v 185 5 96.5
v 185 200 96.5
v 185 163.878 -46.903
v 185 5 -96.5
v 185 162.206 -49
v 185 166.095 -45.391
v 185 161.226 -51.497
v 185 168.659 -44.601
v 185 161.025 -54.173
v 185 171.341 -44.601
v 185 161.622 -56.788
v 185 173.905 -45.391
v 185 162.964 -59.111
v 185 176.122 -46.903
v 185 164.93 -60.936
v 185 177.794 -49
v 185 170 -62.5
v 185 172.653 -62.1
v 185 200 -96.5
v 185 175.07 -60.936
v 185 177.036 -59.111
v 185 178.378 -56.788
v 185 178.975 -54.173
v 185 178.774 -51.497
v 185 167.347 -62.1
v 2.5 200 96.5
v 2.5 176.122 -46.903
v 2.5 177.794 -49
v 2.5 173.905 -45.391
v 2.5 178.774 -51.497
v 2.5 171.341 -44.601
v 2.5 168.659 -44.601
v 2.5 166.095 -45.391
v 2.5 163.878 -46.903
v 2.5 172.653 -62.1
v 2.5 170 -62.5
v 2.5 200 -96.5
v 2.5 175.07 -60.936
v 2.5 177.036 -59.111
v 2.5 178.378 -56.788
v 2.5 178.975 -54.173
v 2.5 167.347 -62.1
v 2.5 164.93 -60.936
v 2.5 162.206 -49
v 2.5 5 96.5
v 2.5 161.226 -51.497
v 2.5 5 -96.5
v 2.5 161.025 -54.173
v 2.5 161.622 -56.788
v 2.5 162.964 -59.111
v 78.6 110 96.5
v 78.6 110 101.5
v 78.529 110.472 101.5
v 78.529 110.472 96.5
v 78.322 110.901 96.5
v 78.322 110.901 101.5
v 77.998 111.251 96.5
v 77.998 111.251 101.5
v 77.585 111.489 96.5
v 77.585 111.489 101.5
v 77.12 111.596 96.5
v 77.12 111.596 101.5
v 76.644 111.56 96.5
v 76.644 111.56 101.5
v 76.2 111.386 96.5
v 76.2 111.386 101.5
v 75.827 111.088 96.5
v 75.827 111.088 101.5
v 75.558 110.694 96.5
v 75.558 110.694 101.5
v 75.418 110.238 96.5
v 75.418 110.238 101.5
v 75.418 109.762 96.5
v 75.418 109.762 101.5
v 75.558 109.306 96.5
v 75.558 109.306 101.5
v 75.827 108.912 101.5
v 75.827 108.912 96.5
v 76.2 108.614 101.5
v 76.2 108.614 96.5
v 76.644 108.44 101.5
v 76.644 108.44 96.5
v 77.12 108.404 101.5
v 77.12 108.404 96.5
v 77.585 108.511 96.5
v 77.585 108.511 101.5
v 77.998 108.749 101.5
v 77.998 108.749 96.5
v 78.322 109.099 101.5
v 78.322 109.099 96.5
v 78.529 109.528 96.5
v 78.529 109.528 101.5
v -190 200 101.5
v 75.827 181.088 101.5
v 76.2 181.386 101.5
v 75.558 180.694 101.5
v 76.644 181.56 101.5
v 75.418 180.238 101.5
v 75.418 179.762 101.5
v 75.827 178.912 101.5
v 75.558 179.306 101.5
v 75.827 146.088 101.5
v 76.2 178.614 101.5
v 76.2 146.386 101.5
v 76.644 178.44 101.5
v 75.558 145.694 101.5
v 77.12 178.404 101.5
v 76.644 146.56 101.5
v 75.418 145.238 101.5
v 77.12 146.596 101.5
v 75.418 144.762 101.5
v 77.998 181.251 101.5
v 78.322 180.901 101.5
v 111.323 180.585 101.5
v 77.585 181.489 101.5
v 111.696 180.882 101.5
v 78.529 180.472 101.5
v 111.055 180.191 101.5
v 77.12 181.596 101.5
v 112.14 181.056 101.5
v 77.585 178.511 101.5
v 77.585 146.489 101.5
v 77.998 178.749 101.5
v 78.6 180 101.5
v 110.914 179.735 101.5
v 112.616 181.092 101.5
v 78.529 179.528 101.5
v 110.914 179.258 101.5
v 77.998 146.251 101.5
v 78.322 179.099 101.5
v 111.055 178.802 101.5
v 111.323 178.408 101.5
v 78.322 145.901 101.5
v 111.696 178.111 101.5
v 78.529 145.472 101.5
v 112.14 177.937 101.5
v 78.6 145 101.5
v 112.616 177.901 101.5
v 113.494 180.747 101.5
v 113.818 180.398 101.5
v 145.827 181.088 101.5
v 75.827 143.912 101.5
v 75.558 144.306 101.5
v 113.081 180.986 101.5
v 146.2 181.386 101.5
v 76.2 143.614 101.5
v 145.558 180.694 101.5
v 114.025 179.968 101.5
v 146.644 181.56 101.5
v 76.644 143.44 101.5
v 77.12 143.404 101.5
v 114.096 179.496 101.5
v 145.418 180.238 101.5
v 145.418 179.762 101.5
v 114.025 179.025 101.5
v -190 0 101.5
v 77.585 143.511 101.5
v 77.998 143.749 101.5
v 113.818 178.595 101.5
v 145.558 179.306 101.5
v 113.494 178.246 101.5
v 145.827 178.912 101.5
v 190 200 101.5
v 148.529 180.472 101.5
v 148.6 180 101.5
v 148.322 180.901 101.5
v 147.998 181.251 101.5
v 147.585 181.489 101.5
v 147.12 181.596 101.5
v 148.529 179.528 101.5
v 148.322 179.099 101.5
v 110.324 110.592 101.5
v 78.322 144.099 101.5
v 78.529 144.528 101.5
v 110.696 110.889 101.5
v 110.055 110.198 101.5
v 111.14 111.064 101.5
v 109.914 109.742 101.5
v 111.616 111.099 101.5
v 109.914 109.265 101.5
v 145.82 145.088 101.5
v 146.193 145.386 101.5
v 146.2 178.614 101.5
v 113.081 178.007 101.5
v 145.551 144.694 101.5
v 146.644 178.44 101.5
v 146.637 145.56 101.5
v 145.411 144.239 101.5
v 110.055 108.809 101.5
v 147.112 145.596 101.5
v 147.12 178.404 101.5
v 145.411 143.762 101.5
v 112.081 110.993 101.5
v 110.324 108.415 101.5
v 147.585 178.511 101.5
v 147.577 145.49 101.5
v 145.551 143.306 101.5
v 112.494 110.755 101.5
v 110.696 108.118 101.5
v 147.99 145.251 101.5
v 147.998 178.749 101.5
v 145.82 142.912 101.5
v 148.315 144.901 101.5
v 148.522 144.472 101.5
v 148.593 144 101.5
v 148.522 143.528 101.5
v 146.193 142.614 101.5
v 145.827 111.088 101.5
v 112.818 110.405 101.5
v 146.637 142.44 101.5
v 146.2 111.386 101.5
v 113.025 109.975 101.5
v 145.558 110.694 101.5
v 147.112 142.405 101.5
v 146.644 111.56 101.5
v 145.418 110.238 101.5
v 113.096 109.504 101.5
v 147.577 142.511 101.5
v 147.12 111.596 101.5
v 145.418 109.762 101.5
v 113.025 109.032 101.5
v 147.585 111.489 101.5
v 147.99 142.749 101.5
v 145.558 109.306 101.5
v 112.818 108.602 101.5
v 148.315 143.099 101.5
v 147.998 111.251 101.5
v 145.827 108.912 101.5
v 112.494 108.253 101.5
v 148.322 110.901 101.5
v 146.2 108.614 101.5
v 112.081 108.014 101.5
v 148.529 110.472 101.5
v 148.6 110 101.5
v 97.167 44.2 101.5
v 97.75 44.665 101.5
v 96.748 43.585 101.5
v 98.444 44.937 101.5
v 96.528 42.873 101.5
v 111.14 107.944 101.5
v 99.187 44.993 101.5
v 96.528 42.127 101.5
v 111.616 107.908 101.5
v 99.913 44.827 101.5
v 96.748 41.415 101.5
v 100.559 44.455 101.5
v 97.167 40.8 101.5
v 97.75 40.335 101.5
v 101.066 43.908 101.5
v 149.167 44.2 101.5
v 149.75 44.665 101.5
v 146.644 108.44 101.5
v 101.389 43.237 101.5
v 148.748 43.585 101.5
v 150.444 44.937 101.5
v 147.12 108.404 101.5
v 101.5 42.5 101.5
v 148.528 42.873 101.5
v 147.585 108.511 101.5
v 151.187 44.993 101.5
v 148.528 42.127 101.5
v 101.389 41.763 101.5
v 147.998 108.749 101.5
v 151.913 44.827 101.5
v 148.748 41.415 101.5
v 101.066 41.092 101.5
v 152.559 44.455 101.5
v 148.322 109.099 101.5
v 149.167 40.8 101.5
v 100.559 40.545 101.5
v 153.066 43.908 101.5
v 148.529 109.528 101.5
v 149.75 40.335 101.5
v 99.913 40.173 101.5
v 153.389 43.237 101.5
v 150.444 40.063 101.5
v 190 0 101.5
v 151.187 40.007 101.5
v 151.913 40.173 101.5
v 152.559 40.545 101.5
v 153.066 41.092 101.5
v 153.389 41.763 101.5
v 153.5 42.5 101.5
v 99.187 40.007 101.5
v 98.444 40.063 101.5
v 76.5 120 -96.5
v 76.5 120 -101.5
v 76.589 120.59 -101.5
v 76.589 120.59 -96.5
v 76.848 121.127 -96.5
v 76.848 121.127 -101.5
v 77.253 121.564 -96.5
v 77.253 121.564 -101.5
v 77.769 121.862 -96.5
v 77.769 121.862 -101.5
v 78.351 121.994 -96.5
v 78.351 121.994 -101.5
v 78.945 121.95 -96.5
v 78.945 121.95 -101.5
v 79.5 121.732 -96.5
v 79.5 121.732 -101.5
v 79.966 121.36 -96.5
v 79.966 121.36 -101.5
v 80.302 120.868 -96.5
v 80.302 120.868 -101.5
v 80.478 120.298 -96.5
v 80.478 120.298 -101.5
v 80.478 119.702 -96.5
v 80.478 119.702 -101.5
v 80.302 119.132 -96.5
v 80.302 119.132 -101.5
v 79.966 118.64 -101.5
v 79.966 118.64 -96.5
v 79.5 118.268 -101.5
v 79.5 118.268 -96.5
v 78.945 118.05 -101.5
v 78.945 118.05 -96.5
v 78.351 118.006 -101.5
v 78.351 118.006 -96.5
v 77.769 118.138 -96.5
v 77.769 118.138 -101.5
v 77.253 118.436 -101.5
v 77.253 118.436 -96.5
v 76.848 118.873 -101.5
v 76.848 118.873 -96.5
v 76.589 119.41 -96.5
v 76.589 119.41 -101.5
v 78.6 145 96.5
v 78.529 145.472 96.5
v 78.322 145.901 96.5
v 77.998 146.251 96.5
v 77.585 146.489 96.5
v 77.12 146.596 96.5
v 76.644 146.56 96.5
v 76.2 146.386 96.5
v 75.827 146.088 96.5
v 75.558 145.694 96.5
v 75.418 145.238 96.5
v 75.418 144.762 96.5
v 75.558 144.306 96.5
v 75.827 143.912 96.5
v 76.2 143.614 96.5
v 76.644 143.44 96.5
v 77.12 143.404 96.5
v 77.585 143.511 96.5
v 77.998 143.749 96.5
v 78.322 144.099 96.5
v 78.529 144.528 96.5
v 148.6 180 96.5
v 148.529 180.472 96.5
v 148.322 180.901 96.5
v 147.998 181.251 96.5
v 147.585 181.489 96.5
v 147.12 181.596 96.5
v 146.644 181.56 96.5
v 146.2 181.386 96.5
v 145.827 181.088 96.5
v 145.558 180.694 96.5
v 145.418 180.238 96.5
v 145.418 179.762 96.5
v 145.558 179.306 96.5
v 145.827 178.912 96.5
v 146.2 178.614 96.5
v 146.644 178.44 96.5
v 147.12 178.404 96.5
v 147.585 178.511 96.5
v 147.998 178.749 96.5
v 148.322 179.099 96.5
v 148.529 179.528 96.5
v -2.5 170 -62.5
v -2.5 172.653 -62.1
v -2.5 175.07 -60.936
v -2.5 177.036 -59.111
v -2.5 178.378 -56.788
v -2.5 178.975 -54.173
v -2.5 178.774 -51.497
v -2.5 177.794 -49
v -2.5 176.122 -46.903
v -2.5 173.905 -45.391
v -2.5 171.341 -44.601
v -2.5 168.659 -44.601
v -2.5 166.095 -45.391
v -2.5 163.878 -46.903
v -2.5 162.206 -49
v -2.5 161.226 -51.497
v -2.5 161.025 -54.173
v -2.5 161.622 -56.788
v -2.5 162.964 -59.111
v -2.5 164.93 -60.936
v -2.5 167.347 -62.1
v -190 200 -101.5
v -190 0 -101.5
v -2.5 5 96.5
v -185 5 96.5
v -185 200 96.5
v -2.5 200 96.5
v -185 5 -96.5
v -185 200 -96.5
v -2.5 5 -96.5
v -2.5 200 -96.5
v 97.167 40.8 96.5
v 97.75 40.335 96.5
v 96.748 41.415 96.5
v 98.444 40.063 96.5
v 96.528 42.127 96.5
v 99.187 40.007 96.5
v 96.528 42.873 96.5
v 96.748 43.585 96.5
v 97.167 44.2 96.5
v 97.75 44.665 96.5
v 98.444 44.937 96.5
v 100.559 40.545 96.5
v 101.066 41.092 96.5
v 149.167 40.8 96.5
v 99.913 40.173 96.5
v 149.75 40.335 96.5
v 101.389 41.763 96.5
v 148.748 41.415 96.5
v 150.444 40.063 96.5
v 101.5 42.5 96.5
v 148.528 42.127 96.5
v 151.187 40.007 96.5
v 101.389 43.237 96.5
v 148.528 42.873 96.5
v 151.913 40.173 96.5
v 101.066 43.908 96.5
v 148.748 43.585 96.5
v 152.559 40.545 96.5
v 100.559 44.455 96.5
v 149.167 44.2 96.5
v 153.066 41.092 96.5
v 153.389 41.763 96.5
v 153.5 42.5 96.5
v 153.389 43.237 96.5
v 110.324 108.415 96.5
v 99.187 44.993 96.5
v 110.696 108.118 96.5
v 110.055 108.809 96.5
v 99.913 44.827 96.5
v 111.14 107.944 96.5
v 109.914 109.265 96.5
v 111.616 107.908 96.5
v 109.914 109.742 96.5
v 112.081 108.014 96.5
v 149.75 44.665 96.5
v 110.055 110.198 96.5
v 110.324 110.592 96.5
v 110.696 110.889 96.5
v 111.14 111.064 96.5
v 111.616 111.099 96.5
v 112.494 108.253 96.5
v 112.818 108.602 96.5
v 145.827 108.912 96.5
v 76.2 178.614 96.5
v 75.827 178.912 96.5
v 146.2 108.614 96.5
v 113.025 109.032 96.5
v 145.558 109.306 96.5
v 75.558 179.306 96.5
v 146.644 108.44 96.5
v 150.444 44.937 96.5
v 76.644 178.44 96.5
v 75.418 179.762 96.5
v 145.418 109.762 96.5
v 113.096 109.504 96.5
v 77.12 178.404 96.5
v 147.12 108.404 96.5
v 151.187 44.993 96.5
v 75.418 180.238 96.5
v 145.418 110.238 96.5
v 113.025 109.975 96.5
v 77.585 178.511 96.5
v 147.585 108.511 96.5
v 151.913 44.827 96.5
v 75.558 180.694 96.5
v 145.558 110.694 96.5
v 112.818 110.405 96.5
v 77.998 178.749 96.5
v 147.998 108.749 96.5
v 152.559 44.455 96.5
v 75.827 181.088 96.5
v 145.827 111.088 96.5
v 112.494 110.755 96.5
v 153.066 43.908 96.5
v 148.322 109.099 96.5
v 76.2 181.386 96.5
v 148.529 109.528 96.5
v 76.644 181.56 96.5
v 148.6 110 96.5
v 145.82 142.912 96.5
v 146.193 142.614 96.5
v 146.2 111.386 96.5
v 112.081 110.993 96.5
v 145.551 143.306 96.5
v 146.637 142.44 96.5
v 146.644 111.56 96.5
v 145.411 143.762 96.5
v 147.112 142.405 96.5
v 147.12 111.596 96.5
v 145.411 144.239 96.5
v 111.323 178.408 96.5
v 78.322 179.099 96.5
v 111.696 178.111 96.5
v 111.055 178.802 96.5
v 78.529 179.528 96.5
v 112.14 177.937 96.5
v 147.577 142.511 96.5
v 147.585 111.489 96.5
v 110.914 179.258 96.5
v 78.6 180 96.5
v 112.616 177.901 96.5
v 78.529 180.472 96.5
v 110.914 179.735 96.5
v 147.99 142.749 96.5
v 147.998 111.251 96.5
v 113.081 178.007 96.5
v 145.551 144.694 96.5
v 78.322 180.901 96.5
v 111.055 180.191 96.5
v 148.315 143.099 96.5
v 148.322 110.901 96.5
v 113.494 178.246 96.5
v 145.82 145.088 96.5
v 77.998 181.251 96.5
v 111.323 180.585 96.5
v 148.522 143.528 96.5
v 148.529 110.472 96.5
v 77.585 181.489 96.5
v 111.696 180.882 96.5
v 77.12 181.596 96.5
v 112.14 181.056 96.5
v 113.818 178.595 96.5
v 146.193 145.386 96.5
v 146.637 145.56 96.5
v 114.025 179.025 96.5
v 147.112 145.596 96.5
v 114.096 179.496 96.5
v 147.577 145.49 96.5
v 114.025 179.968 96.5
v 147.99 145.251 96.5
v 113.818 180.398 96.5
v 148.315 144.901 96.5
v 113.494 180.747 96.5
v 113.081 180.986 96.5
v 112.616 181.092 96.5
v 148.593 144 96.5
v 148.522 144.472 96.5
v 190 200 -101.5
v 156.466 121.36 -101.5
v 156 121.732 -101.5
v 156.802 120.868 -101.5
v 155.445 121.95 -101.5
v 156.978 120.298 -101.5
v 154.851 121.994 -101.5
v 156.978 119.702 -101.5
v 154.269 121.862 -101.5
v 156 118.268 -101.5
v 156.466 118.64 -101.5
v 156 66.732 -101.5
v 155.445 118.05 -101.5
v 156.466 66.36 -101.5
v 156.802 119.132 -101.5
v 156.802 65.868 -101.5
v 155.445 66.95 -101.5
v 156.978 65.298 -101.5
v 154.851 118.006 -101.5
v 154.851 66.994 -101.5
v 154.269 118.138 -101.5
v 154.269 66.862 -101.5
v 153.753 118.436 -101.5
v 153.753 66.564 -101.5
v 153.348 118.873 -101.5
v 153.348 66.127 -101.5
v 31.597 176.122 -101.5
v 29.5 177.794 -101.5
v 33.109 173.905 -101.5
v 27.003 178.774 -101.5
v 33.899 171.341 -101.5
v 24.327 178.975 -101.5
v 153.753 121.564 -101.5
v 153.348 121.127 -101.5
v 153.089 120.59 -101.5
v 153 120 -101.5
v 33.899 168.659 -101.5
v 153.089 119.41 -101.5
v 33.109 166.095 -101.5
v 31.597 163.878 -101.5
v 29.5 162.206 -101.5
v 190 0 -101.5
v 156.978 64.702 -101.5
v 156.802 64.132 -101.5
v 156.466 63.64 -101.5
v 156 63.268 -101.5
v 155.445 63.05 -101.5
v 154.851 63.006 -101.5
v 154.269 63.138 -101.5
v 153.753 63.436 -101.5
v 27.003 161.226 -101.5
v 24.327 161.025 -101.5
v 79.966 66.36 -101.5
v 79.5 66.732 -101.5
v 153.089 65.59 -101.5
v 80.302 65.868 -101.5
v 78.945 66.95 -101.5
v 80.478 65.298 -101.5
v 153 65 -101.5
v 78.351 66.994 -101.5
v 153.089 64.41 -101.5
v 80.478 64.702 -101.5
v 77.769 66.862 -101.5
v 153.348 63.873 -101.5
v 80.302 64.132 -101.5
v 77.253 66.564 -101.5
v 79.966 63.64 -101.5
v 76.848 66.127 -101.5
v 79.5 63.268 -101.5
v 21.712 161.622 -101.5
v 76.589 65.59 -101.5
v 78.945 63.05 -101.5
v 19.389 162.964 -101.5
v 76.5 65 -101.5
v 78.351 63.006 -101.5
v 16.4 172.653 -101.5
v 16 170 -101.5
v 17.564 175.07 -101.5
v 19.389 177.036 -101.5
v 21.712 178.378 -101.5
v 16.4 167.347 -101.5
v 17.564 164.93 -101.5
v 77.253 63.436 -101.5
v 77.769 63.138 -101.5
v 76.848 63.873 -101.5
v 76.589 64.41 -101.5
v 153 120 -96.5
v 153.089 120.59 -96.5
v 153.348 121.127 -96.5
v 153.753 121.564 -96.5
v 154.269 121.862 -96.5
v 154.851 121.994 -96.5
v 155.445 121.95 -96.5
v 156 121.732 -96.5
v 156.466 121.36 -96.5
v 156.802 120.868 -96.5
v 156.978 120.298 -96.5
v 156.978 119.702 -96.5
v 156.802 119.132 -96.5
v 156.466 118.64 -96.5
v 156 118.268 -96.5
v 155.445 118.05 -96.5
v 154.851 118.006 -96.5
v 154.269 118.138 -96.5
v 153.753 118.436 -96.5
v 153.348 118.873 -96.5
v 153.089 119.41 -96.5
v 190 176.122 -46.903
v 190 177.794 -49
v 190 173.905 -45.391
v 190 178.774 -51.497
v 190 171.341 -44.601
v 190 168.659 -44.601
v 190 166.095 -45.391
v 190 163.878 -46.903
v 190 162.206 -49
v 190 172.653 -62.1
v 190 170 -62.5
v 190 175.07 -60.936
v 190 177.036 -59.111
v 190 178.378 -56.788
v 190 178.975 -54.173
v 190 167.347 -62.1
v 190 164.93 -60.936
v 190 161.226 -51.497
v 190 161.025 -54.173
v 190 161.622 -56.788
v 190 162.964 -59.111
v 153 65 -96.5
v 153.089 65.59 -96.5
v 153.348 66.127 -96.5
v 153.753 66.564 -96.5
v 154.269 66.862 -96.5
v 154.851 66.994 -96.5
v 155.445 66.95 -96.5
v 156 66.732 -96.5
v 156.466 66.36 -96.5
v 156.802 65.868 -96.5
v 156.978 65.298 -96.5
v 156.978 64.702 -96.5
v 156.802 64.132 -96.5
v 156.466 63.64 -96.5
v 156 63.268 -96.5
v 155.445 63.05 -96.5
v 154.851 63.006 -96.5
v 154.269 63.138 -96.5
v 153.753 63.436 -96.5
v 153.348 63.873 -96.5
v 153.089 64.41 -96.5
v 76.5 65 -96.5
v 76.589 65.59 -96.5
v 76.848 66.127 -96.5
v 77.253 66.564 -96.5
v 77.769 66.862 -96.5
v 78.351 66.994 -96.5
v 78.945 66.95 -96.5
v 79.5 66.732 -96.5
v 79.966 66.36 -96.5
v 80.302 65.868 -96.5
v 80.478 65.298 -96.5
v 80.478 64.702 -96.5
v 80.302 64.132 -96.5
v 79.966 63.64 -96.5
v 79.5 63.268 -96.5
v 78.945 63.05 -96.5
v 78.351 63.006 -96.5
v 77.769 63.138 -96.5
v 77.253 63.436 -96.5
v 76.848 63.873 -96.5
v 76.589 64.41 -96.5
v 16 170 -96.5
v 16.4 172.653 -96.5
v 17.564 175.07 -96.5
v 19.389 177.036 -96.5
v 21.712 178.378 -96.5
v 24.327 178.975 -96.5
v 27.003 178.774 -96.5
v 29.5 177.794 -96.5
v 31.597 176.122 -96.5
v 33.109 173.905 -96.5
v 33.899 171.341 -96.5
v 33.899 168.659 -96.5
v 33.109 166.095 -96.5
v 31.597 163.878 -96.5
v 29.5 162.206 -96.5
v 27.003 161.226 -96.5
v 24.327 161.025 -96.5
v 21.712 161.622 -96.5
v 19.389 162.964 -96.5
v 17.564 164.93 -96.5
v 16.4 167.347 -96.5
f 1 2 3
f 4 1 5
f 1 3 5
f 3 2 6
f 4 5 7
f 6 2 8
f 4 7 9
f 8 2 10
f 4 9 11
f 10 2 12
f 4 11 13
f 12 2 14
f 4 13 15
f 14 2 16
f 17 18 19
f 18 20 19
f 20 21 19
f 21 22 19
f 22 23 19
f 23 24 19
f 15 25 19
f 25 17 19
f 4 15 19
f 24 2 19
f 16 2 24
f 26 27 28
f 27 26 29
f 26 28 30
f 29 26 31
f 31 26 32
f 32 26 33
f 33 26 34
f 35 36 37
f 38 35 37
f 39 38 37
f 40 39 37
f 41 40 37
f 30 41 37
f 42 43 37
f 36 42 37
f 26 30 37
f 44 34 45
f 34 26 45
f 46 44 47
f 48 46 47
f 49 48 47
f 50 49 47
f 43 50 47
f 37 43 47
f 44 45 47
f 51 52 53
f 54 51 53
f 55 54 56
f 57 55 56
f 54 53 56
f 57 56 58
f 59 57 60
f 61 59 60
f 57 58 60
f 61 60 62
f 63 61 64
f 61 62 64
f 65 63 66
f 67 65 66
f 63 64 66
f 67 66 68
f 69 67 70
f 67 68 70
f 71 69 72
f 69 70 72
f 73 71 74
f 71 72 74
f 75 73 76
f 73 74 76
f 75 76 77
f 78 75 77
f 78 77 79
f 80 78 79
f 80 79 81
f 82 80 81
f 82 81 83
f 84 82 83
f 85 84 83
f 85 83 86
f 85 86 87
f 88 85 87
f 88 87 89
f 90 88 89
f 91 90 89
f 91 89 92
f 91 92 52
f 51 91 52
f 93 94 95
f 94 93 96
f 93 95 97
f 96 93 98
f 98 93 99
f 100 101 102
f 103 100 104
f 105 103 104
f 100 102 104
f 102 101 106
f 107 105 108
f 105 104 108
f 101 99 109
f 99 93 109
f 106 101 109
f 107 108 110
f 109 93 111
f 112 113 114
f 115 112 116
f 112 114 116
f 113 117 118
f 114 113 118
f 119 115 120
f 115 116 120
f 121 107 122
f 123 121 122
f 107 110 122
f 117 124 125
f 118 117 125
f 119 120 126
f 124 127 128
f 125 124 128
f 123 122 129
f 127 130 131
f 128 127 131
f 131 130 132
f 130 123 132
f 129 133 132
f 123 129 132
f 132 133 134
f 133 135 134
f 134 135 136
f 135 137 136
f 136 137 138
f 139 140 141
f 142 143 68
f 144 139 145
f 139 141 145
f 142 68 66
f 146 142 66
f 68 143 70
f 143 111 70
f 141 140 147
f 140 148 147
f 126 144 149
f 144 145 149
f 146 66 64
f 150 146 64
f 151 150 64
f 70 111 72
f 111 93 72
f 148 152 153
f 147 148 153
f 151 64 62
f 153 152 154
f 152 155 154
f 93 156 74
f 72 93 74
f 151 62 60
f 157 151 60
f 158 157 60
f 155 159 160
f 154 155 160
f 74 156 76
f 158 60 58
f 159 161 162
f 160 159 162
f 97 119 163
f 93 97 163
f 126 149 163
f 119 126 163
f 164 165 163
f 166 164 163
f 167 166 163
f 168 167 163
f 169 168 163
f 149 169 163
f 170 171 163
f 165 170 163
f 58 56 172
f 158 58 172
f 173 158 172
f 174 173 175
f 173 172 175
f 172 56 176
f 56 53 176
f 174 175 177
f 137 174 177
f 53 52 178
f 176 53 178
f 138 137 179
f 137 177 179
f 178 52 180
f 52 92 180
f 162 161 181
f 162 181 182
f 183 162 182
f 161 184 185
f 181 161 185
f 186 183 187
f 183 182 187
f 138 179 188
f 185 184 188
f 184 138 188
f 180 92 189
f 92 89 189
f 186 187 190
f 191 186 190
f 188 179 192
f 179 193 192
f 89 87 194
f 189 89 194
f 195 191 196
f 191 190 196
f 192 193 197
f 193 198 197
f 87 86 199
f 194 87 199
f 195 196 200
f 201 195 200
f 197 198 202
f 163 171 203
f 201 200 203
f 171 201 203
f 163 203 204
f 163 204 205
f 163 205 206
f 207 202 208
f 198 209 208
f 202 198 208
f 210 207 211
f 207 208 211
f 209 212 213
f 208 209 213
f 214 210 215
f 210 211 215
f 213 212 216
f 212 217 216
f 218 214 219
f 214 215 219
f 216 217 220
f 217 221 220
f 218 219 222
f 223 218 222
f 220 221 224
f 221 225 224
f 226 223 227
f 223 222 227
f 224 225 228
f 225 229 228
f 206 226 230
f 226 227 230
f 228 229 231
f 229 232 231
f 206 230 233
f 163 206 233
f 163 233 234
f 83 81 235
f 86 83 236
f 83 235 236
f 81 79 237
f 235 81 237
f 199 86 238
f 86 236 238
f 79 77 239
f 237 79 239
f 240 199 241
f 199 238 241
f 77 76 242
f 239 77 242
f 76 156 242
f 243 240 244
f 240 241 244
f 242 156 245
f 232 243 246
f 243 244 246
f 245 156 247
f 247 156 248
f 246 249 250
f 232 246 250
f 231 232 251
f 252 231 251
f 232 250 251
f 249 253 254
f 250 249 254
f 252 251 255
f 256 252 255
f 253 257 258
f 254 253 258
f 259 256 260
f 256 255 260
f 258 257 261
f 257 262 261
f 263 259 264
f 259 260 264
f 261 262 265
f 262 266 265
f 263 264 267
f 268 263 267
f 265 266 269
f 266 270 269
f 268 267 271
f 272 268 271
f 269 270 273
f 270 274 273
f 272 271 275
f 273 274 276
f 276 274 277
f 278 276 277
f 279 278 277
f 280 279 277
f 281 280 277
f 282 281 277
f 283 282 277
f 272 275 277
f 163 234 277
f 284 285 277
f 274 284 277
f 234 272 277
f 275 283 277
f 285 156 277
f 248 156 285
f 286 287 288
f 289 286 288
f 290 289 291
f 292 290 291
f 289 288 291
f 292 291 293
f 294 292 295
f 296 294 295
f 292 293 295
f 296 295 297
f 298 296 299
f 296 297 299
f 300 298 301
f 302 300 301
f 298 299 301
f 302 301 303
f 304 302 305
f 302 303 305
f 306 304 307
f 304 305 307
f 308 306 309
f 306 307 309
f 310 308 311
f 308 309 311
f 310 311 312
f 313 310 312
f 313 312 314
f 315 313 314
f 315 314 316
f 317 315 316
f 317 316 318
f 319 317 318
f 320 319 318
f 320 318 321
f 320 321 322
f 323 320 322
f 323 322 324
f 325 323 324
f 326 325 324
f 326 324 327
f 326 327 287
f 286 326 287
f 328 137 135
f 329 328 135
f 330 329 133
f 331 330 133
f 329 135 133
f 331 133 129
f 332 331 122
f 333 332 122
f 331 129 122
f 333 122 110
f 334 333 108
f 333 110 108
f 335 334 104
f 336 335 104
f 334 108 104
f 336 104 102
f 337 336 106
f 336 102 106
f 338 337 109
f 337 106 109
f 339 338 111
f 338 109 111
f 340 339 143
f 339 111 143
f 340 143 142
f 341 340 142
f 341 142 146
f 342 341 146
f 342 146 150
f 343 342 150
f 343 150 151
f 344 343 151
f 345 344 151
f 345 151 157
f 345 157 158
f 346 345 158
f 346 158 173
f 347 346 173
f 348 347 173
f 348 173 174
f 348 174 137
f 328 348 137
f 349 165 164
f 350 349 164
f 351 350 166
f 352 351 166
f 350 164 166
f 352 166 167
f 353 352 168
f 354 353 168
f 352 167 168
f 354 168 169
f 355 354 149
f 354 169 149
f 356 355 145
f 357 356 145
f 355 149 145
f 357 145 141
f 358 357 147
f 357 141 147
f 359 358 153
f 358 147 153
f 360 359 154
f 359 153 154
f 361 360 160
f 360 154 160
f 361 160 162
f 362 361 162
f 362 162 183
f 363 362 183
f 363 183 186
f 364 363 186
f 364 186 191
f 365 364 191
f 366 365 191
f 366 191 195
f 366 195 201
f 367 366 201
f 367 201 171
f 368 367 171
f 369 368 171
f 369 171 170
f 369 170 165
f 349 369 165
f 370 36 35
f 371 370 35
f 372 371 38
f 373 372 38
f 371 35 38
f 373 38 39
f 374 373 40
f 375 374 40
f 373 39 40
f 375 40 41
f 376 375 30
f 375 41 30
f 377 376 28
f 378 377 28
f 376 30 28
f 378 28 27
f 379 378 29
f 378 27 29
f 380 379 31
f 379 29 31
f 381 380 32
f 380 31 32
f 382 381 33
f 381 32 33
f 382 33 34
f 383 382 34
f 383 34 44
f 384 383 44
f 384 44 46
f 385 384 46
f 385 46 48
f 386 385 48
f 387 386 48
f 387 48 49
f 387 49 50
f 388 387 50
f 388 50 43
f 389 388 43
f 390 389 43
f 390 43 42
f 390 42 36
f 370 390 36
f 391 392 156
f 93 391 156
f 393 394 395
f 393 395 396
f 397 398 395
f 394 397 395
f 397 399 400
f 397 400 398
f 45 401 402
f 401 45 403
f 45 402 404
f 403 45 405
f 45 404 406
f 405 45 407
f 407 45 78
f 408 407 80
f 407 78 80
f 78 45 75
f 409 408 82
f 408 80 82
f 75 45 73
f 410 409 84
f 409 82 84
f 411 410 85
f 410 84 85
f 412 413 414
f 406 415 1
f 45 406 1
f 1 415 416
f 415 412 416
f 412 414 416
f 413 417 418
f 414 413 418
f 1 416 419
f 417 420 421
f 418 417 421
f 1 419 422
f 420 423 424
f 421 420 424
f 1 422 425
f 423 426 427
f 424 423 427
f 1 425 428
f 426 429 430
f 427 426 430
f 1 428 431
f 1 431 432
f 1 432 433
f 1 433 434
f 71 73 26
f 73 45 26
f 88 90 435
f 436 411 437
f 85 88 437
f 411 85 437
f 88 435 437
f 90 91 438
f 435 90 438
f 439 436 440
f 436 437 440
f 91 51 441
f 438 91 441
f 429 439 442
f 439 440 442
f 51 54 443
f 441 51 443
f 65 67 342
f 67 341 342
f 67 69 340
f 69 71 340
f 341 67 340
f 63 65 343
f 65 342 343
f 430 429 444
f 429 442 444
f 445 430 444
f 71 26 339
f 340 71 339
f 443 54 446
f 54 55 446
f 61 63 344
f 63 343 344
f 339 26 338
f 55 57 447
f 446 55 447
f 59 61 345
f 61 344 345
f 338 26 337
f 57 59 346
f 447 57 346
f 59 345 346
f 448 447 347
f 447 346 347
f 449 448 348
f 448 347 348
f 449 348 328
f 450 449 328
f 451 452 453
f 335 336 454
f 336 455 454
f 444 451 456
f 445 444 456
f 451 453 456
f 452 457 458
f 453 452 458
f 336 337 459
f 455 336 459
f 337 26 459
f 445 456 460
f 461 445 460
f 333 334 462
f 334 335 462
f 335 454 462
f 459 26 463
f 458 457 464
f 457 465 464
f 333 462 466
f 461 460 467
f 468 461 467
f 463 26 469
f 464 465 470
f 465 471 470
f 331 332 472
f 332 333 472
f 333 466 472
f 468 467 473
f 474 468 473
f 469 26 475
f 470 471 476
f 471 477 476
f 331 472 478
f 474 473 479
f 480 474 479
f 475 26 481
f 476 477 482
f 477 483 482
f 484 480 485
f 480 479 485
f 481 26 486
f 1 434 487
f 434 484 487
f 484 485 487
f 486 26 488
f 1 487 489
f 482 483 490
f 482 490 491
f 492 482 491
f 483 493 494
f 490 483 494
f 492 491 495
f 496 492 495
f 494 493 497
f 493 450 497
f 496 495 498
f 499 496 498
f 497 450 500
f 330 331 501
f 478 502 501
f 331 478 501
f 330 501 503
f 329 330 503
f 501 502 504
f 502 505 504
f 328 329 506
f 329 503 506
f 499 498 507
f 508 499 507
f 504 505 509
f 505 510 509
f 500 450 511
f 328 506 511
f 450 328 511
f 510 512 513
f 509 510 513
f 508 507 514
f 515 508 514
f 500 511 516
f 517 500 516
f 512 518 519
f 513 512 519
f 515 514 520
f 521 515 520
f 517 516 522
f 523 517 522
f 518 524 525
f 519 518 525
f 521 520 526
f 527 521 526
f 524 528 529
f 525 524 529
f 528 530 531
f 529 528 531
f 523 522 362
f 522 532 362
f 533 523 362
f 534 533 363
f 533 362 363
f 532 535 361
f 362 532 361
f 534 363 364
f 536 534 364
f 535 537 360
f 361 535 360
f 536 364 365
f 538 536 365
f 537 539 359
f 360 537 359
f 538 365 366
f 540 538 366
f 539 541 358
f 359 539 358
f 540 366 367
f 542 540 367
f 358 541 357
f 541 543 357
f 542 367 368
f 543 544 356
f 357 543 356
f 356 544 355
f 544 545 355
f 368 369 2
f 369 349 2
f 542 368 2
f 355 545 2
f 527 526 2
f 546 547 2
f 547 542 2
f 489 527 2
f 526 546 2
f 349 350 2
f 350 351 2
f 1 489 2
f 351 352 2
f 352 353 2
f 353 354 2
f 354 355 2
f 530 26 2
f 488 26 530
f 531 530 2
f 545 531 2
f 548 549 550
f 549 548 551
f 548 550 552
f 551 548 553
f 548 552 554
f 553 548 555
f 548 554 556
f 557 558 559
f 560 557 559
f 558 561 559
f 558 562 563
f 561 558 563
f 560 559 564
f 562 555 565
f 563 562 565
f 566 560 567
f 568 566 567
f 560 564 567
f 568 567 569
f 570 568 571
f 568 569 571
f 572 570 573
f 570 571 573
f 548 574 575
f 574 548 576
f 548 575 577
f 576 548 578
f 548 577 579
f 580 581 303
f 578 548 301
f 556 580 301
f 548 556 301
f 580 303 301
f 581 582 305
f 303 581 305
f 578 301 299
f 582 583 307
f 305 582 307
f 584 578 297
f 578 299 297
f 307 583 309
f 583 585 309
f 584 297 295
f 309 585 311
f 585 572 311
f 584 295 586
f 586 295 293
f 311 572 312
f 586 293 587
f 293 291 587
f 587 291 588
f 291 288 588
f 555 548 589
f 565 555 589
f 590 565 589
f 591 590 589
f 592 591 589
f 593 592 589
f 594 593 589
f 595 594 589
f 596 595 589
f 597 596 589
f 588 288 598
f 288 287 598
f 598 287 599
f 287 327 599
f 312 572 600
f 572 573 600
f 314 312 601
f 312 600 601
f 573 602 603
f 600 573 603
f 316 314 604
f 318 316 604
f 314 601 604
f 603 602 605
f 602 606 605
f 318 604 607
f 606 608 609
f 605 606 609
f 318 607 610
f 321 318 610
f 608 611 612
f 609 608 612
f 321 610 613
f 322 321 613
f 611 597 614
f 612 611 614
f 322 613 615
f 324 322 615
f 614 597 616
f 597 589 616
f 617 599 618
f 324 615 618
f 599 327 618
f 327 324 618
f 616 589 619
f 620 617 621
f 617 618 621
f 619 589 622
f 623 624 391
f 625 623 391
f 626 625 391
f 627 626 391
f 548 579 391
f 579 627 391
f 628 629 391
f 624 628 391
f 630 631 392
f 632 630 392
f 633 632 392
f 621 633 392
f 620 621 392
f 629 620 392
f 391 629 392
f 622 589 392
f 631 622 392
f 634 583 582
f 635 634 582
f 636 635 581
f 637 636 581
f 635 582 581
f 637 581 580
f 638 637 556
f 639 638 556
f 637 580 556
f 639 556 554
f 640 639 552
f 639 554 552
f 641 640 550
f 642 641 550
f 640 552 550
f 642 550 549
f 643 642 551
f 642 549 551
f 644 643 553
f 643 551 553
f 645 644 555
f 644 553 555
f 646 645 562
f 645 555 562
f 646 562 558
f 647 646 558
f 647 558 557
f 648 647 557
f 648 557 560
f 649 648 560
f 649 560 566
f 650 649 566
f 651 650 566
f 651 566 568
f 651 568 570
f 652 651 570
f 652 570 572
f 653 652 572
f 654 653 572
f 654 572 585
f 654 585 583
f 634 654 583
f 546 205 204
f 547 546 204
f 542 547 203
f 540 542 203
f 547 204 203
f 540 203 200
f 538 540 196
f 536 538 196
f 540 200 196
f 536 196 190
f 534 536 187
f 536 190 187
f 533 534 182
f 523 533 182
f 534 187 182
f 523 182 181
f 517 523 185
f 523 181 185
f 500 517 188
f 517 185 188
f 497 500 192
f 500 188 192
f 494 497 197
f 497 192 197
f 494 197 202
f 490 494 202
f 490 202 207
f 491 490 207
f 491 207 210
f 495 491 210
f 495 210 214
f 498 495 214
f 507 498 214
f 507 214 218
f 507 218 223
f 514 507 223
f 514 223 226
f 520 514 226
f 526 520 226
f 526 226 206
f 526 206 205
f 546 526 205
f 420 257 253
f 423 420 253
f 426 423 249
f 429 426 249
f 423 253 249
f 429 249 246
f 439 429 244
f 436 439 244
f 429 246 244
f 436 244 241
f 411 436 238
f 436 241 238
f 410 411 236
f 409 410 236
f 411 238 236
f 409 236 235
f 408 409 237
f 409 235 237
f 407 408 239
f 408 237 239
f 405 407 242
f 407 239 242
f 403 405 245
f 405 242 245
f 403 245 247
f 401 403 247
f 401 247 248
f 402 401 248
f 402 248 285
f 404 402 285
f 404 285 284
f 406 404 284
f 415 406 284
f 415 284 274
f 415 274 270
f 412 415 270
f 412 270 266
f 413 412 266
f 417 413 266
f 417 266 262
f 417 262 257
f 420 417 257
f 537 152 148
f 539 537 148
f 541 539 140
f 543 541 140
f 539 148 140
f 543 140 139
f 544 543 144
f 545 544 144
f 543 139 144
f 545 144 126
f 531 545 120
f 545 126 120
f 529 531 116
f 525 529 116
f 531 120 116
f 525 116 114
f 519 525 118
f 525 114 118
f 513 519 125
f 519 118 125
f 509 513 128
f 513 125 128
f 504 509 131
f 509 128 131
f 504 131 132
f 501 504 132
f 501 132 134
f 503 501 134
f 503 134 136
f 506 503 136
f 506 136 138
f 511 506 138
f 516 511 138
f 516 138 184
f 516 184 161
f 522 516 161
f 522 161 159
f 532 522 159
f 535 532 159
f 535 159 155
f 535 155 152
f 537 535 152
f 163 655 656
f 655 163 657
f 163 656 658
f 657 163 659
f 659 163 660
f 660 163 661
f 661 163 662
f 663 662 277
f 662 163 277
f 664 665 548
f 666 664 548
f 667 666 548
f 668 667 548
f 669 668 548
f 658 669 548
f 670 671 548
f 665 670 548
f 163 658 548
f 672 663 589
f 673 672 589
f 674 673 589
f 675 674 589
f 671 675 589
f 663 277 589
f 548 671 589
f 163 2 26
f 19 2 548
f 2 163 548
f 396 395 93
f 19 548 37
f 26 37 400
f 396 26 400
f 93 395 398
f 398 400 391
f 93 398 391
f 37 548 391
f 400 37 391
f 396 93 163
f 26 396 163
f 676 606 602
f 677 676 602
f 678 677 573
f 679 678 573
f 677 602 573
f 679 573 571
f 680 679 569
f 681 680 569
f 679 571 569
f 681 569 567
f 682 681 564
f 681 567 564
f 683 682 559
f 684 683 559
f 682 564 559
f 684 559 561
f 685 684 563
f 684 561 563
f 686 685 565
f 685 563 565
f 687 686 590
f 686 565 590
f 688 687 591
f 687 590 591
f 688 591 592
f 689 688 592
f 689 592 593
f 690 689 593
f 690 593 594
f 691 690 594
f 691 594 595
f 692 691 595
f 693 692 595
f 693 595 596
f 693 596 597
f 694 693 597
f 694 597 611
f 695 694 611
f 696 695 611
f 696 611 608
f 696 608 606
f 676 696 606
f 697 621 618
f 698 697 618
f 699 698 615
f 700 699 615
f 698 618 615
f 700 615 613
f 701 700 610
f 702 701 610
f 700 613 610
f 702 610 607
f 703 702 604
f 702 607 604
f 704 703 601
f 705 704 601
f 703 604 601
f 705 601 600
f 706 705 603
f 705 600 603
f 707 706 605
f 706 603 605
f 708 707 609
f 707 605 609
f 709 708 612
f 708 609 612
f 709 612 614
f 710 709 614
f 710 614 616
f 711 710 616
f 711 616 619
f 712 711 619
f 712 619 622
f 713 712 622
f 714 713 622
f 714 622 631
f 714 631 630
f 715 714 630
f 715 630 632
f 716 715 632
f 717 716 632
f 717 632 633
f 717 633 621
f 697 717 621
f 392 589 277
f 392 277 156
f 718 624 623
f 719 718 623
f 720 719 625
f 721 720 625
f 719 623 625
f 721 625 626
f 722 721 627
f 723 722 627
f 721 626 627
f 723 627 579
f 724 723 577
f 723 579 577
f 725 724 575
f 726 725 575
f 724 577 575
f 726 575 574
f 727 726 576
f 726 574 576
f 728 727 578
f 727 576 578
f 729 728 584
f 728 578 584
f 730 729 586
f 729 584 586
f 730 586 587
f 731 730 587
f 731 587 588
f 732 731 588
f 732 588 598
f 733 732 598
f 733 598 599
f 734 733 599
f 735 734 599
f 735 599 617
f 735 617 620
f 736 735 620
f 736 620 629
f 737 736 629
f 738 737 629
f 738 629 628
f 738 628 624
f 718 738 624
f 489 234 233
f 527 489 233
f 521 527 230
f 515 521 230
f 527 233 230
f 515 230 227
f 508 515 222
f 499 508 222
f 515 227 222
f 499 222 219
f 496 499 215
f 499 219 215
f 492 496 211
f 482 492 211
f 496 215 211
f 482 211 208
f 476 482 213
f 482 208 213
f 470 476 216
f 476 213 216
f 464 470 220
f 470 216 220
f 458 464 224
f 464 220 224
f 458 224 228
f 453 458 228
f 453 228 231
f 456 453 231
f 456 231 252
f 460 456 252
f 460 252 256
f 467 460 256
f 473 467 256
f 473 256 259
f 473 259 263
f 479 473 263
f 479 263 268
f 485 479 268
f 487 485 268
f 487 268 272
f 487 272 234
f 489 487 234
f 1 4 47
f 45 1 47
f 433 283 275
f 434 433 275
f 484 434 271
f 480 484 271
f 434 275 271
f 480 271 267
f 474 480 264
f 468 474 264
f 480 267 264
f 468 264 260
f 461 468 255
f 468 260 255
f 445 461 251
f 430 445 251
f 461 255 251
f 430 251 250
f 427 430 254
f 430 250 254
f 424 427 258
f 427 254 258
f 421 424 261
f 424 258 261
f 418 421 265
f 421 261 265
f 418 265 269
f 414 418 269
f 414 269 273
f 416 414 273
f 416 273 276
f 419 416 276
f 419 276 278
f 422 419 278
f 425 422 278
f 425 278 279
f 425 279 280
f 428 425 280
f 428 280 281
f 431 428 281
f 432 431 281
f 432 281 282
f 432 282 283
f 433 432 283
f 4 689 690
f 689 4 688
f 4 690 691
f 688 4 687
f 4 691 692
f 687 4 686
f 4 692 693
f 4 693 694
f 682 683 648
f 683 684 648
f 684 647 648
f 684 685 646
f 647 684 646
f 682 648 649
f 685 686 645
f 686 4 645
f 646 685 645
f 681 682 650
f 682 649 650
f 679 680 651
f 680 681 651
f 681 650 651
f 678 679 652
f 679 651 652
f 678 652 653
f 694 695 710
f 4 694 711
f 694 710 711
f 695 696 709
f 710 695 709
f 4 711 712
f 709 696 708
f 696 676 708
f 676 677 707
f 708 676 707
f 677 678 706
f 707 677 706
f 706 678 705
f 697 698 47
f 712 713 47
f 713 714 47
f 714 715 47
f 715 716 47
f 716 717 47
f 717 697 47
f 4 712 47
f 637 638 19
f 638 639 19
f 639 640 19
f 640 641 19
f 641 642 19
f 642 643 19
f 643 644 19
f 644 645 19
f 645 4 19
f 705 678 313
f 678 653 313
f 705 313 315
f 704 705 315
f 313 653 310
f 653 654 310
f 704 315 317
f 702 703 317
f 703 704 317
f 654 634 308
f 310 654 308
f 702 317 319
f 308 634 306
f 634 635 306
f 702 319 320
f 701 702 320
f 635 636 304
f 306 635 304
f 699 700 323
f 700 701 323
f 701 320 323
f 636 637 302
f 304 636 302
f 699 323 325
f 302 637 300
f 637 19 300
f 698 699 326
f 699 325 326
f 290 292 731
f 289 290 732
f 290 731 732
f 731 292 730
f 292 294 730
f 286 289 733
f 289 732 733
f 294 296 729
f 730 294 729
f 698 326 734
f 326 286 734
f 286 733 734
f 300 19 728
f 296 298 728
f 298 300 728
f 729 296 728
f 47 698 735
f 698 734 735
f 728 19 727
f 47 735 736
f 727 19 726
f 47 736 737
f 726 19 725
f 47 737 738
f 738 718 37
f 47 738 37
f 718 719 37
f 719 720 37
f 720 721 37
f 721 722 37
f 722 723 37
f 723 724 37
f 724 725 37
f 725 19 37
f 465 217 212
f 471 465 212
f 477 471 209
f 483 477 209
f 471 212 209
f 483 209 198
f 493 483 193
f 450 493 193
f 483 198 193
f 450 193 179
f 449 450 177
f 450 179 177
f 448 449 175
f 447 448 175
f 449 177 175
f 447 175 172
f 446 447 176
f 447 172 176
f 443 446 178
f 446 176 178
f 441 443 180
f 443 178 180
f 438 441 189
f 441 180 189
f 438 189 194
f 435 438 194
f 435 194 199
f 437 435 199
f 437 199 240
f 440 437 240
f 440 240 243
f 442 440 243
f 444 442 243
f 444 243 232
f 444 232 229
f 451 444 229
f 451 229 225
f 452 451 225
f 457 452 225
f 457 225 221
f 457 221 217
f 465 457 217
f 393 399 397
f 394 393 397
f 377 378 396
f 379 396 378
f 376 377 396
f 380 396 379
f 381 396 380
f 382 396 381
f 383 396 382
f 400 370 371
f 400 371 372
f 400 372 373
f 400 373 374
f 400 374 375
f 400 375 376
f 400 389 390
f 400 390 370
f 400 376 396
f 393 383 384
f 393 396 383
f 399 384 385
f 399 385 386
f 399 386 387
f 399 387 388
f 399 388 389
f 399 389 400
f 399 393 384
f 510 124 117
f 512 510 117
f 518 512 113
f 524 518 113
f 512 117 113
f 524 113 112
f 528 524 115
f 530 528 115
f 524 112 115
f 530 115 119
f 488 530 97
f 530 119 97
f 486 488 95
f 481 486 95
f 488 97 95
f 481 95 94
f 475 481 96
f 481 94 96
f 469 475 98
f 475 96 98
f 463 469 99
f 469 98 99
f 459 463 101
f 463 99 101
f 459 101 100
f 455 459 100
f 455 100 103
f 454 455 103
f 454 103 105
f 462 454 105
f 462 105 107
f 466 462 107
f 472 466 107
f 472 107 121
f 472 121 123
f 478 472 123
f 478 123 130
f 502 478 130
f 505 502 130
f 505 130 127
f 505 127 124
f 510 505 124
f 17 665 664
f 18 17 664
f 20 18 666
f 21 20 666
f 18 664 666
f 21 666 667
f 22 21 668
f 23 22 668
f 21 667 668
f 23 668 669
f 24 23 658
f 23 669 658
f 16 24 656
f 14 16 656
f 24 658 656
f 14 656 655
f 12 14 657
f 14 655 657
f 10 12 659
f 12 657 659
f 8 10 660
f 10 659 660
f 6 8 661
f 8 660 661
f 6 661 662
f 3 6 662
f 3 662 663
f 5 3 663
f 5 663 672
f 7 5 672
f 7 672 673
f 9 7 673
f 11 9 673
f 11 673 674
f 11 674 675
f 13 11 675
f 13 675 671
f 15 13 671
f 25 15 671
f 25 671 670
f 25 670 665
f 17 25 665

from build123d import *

# Parameters (mm, degrees)
EXTRUDE_1_DEPTH     = 200
CUT_EXTRUDE_1_DEPTH = 195
CUT_EXTRUDE_4_REACH = 443.251
SKETCH_9_R          = 9
CUT_EXTRUDE_5_REACH = 344.504
SKETCH_11_R         = 1.6
CUT_EXTRUDE_6_REACH = 344.504
SKETCH_12_R         = 1.6
CUT_EXTRUDE_7_REACH = 344.504
SKETCH_13_R         = 2.5
SKETCH_14_W         = 5
SKETCH_14_H         = 193
EXTRUDE_2_DEPTH     = 195
CUT_EXTRUDE_8_REACH = 344.504
SKETCH_15_R         = 2
SKETCH_15_R_2       = 9
CUT_EXTRUDE_9_REACH = 297.565
SKETCH_16_R         = 9


with BuildPart() as part:
    # 草图1 → 凸台-拉伸1 (new body)
    with BuildSketch(Plane(origin=(0, 0, 0), x_dir=(1, 0, 0), z_dir=(0, 1, 0))):
        Polygon((-190, 78.5), (-190, 101.5), (-167, 101.5), (167, 101.5), (190, 101.5), (190, 78.5), (190, -78.5), (190, -101.5), (167, -101.5), (-167, -101.5), (-190, -101.5), (-190, -78.5), align=None)
    extrude(amount=EXTRUDE_1_DEPTH)

    # 草图3 → 切除-拉伸1 (cut)
    with BuildSketch(Plane(origin=(0, 200, 0), x_dir=(1, 0, 0), z_dir=(0, 1, 0))):
        Polygon((-167, 96.5), (167, 96.5), (185, 96.5), (185, 78.5), (185, -78.5), (185, -96.5), (167, -96.5), (-167, -96.5), (-185, -96.5), (-185, -78.5), (-185, 78.5), (-185, 96.5), align=None)
    extrude(amount=-CUT_EXTRUDE_1_DEPTH, mode=Mode.SUBTRACT)

    # 草图9 → 切除-拉伸4 (cut, up to next)
    with BuildSketch(Plane(origin=(190, 0, 0), x_dir=(0, 0, -1), z_dir=(1, 0, 0)), mode=Mode.PRIVATE) as cut_extrude_4_sk1:
        with Locations((53.5, 170)):
            Circle(SKETCH_9_R)
    cut_extrude_4_tool1 = extrude(cut_extrude_4_sk1.sketch, amount=-CUT_EXTRUDE_4_REACH, mode=Mode.PRIVATE) & part.part
    add(cut_extrude_4_tool1.solids().sort_by_distance((190, 170, -53.5))[0], mode=Mode.SUBTRACT)

    # 草图11 → 切除-拉伸5 (cut, up to next)
    with BuildSketch(Plane.XY.offset(101.5), mode=Mode.PRIVATE) as cut_extrude_5_sk1:
        with Locations((77, 180)):
            Circle(SKETCH_11_R)
    cut_extrude_5_tool1 = extrude(cut_extrude_5_sk1.sketch, amount=-CUT_EXTRUDE_5_REACH, mode=Mode.PRIVATE) & part.part
    # 草图11 → 切除-拉伸5 (cut, up to next)
    with BuildSketch(Plane.XY.offset(101.5), mode=Mode.PRIVATE) as cut_extrude_5_sk2:
        with Locations((147, 180)):
            Circle(SKETCH_11_R)
    cut_extrude_5_tool2 = extrude(cut_extrude_5_sk2.sketch, amount=-CUT_EXTRUDE_5_REACH, mode=Mode.PRIVATE) & part.part
    # 草图11 → 切除-拉伸5 (cut, up to next)
    with BuildSketch(Plane.XY.offset(101.5), mode=Mode.PRIVATE) as cut_extrude_5_sk3:
        with Locations((77, 110)):
            Circle(SKETCH_11_R)
    cut_extrude_5_tool3 = extrude(cut_extrude_5_sk3.sketch, amount=-CUT_EXTRUDE_5_REACH, mode=Mode.PRIVATE) & part.part
    # 草图11 → 切除-拉伸5 (cut, up to next)
    with BuildSketch(Plane.XY.offset(101.5), mode=Mode.PRIVATE) as cut_extrude_5_sk4:
        with Locations((147, 110)):
            Circle(SKETCH_11_R)
    cut_extrude_5_tool4 = extrude(cut_extrude_5_sk4.sketch, amount=-CUT_EXTRUDE_5_REACH, mode=Mode.PRIVATE) & part.part
    add(cut_extrude_5_tool1.solids().sort_by_distance((77, 180, 101.5))[0], mode=Mode.SUBTRACT)
    add(cut_extrude_5_tool2.solids().sort_by_distance((147, 180, 101.5))[0], mode=Mode.SUBTRACT)
    add(cut_extrude_5_tool3.solids().sort_by_distance((77, 110, 101.5))[0], mode=Mode.SUBTRACT)
    add(cut_extrude_5_tool4.solids().sort_by_distance((147, 110, 101.5))[0], mode=Mode.SUBTRACT)

    # 草图12 → 切除-拉伸6 (cut, up to next)
    with BuildSketch(Plane.XY.offset(101.5), mode=Mode.PRIVATE) as cut_extrude_6_sk1:
        with Locations((77, 145)):
            Circle(SKETCH_12_R)
    cut_extrude_6_tool1 = extrude(cut_extrude_6_sk1.sketch, amount=-CUT_EXTRUDE_6_REACH, mode=Mode.PRIVATE) & part.part
    # 草图12 → 切除-拉伸6 (cut, up to next)
    with BuildSketch(Plane.XY.offset(101.5), mode=Mode.PRIVATE) as cut_extrude_6_sk2:
        with Locations((112.496378105, 179.496480131)):
            Circle(SKETCH_12_R)
    cut_extrude_6_tool2 = extrude(cut_extrude_6_sk2.sketch, amount=-CUT_EXTRUDE_6_REACH, mode=Mode.PRIVATE) & part.part
    # 草图12 → 切除-拉伸6 (cut, up to next)
    with BuildSketch(Plane.XY.offset(101.5), mode=Mode.PRIVATE) as cut_extrude_6_sk3:
        with Locations((146.992858236, 144.000102025)):
            Circle(SKETCH_12_R)
    cut_extrude_6_tool3 = extrude(cut_extrude_6_sk3.sketch, amount=-CUT_EXTRUDE_6_REACH, mode=Mode.PRIVATE) & part.part
    # 草图12 → 切除-拉伸6 (cut, up to next)
    with BuildSketch(Plane.XY.offset(101.5), mode=Mode.PRIVATE) as cut_extrude_6_sk4:
        with Locations((111.496480131, 109.503621895)):
            Circle(SKETCH_12_R)
    cut_extrude_6_tool4 = extrude(cut_extrude_6_sk4.sketch, amount=-CUT_EXTRUDE_6_REACH, mode=Mode.PRIVATE) & part.part
    add(cut_extrude_6_tool1.solids().sort_by_distance((77, 145, 101.5))[0], mode=Mode.SUBTRACT)
    add(cut_extrude_6_tool2.solids().sort_by_distance((112.496378, 179.49648, 101.5))[0], mode=Mode.SUBTRACT)
    add(cut_extrude_6_tool3.solids().sort_by_distance((146.992858, 144.000102, 101.5))[0], mode=Mode.SUBTRACT)
    add(cut_extrude_6_tool4.solids().sort_by_distance((111.49648, 109.503622, 101.5))[0], mode=Mode.SUBTRACT)

    # 草图13 → 切除-拉伸7 (cut, up to next)
    with BuildSketch(Plane.XY.offset(101.5), mode=Mode.PRIVATE) as cut_extrude_7_sk1:
        with Locations((99, 42.5)):
            Circle(SKETCH_13_R)
    cut_extrude_7_tool1 = extrude(cut_extrude_7_sk1.sketch, amount=-CUT_EXTRUDE_7_REACH, mode=Mode.PRIVATE) & part.part
    # 草图13 → 切除-拉伸7 (cut, up to next)
    with BuildSketch(Plane.XY.offset(101.5), mode=Mode.PRIVATE) as cut_extrude_7_sk2:
        with Locations((151, 42.5)):
            Circle(SKETCH_13_R)
    cut_extrude_7_tool2 = extrude(cut_extrude_7_sk2.sketch, amount=-CUT_EXTRUDE_7_REACH, mode=Mode.PRIVATE) & part.part
    add(cut_extrude_7_tool1.solids().sort_by_distance((99, 42.5, 101.5))[0], mode=Mode.SUBTRACT)
    add(cut_extrude_7_tool2.solids().sort_by_distance((151, 42.5, 101.5))[0], mode=Mode.SUBTRACT)

    # 草图14 → 凸台-拉伸2 (add)
    with BuildSketch(Plane(origin=(0, 5, 0), x_dir=(1, 0, 0), z_dir=(0, 1, 0))):
        Rectangle(SKETCH_14_W, SKETCH_14_H)
    extrude(amount=EXTRUDE_2_DEPTH)

    # 草图15 → 切除-拉伸8 (cut, up to next)
    with BuildSketch(Plane(origin=(0, 0, -101.5), x_dir=(-1, 0, 0), z_dir=(0, 0, -1)), mode=Mode.PRIVATE) as cut_extrude_8_sk1:
        with Locations((-155, 120)):
            Circle(SKETCH_15_R)
    cut_extrude_8_tool1 = extrude(cut_extrude_8_sk1.sketch, amount=-CUT_EXTRUDE_8_REACH, mode=Mode.PRIVATE) & part.part
    # 草图15 → 切除-拉伸8 (cut, up to next)
    with BuildSketch(Plane(origin=(0, 0, -101.5), x_dir=(-1, 0, 0), z_dir=(0, 0, -1)), mode=Mode.PRIVATE) as cut_extrude_8_sk2:
        with Locations((-78.5, 120)):
            Circle(SKETCH_15_R)
    cut_extrude_8_tool2 = extrude(cut_extrude_8_sk2.sketch, amount=-CUT_EXTRUDE_8_REACH, mode=Mode.PRIVATE) & part.part
    # 草图15 → 切除-拉伸8 (cut, up to next)
    with BuildSketch(Plane(origin=(0, 0, -101.5), x_dir=(-1, 0, 0), z_dir=(0, 0, -1)), mode=Mode.PRIVATE) as cut_extrude_8_sk3:
        with Locations((-78.5, 65)):
            Circle(SKETCH_15_R)
    cut_extrude_8_tool3 = extrude(cut_extrude_8_sk3.sketch, amount=-CUT_EXTRUDE_8_REACH, mode=Mode.PRIVATE) & part.part
    # 草图15 → 切除-拉伸8 (cut, up to next)
    with BuildSketch(Plane(origin=(0, 0, -101.5), x_dir=(-1, 0, 0), z_dir=(0, 0, -1)), mode=Mode.PRIVATE) as cut_extrude_8_sk4:
        with Locations((-155, 65)):
            Circle(SKETCH_15_R)
    cut_extrude_8_tool4 = extrude(cut_extrude_8_sk4.sketch, amount=-CUT_EXTRUDE_8_REACH, mode=Mode.PRIVATE) & part.part
    # 草图15 → 切除-拉伸8 (cut, up to next)
    with BuildSketch(Plane(origin=(0, 0, -101.5), x_dir=(-1, 0, 0), z_dir=(0, 0, -1)), mode=Mode.PRIVATE) as cut_extrude_8_sk5:
        with Locations((-25, 170)):
            Circle(SKETCH_15_R_2)
    cut_extrude_8_tool5 = extrude(cut_extrude_8_sk5.sketch, amount=-CUT_EXTRUDE_8_REACH, mode=Mode.PRIVATE) & part.part
    add(cut_extrude_8_tool1.solids().sort_by_distance((155, 120, -101.5))[0], mode=Mode.SUBTRACT)
    add(cut_extrude_8_tool2.solids().sort_by_distance((78.5, 120, -101.5))[0], mode=Mode.SUBTRACT)
    add(cut_extrude_8_tool3.solids().sort_by_distance((78.5, 65, -101.5))[0], mode=Mode.SUBTRACT)
    add(cut_extrude_8_tool4.solids().sort_by_distance((155, 65, -101.5))[0], mode=Mode.SUBTRACT)
    add(cut_extrude_8_tool5.solids().sort_by_distance((25, 170, -101.5))[0], mode=Mode.SUBTRACT)

    # 草图16 → 切除-拉伸9 (cut, up to next)
    with BuildSketch(Plane(origin=(2.5, 0, 0), x_dir=(0, 0, -1), z_dir=(1, 0, 0)), mode=Mode.PRIVATE) as cut_extrude_9_sk1:
        with Locations((53.5, 170)):
            Circle(SKETCH_16_R)
    cut_extrude_9_tool1 = extrude(cut_extrude_9_sk1.sketch, amount=-CUT_EXTRUDE_9_REACH, mode=Mode.PRIVATE) & part.part
    add(cut_extrude_9_tool1.solids().sort_by_distance((2.5, 170, -53.5))[0], mode=Mode.SUBTRACT)


solid = part.part
